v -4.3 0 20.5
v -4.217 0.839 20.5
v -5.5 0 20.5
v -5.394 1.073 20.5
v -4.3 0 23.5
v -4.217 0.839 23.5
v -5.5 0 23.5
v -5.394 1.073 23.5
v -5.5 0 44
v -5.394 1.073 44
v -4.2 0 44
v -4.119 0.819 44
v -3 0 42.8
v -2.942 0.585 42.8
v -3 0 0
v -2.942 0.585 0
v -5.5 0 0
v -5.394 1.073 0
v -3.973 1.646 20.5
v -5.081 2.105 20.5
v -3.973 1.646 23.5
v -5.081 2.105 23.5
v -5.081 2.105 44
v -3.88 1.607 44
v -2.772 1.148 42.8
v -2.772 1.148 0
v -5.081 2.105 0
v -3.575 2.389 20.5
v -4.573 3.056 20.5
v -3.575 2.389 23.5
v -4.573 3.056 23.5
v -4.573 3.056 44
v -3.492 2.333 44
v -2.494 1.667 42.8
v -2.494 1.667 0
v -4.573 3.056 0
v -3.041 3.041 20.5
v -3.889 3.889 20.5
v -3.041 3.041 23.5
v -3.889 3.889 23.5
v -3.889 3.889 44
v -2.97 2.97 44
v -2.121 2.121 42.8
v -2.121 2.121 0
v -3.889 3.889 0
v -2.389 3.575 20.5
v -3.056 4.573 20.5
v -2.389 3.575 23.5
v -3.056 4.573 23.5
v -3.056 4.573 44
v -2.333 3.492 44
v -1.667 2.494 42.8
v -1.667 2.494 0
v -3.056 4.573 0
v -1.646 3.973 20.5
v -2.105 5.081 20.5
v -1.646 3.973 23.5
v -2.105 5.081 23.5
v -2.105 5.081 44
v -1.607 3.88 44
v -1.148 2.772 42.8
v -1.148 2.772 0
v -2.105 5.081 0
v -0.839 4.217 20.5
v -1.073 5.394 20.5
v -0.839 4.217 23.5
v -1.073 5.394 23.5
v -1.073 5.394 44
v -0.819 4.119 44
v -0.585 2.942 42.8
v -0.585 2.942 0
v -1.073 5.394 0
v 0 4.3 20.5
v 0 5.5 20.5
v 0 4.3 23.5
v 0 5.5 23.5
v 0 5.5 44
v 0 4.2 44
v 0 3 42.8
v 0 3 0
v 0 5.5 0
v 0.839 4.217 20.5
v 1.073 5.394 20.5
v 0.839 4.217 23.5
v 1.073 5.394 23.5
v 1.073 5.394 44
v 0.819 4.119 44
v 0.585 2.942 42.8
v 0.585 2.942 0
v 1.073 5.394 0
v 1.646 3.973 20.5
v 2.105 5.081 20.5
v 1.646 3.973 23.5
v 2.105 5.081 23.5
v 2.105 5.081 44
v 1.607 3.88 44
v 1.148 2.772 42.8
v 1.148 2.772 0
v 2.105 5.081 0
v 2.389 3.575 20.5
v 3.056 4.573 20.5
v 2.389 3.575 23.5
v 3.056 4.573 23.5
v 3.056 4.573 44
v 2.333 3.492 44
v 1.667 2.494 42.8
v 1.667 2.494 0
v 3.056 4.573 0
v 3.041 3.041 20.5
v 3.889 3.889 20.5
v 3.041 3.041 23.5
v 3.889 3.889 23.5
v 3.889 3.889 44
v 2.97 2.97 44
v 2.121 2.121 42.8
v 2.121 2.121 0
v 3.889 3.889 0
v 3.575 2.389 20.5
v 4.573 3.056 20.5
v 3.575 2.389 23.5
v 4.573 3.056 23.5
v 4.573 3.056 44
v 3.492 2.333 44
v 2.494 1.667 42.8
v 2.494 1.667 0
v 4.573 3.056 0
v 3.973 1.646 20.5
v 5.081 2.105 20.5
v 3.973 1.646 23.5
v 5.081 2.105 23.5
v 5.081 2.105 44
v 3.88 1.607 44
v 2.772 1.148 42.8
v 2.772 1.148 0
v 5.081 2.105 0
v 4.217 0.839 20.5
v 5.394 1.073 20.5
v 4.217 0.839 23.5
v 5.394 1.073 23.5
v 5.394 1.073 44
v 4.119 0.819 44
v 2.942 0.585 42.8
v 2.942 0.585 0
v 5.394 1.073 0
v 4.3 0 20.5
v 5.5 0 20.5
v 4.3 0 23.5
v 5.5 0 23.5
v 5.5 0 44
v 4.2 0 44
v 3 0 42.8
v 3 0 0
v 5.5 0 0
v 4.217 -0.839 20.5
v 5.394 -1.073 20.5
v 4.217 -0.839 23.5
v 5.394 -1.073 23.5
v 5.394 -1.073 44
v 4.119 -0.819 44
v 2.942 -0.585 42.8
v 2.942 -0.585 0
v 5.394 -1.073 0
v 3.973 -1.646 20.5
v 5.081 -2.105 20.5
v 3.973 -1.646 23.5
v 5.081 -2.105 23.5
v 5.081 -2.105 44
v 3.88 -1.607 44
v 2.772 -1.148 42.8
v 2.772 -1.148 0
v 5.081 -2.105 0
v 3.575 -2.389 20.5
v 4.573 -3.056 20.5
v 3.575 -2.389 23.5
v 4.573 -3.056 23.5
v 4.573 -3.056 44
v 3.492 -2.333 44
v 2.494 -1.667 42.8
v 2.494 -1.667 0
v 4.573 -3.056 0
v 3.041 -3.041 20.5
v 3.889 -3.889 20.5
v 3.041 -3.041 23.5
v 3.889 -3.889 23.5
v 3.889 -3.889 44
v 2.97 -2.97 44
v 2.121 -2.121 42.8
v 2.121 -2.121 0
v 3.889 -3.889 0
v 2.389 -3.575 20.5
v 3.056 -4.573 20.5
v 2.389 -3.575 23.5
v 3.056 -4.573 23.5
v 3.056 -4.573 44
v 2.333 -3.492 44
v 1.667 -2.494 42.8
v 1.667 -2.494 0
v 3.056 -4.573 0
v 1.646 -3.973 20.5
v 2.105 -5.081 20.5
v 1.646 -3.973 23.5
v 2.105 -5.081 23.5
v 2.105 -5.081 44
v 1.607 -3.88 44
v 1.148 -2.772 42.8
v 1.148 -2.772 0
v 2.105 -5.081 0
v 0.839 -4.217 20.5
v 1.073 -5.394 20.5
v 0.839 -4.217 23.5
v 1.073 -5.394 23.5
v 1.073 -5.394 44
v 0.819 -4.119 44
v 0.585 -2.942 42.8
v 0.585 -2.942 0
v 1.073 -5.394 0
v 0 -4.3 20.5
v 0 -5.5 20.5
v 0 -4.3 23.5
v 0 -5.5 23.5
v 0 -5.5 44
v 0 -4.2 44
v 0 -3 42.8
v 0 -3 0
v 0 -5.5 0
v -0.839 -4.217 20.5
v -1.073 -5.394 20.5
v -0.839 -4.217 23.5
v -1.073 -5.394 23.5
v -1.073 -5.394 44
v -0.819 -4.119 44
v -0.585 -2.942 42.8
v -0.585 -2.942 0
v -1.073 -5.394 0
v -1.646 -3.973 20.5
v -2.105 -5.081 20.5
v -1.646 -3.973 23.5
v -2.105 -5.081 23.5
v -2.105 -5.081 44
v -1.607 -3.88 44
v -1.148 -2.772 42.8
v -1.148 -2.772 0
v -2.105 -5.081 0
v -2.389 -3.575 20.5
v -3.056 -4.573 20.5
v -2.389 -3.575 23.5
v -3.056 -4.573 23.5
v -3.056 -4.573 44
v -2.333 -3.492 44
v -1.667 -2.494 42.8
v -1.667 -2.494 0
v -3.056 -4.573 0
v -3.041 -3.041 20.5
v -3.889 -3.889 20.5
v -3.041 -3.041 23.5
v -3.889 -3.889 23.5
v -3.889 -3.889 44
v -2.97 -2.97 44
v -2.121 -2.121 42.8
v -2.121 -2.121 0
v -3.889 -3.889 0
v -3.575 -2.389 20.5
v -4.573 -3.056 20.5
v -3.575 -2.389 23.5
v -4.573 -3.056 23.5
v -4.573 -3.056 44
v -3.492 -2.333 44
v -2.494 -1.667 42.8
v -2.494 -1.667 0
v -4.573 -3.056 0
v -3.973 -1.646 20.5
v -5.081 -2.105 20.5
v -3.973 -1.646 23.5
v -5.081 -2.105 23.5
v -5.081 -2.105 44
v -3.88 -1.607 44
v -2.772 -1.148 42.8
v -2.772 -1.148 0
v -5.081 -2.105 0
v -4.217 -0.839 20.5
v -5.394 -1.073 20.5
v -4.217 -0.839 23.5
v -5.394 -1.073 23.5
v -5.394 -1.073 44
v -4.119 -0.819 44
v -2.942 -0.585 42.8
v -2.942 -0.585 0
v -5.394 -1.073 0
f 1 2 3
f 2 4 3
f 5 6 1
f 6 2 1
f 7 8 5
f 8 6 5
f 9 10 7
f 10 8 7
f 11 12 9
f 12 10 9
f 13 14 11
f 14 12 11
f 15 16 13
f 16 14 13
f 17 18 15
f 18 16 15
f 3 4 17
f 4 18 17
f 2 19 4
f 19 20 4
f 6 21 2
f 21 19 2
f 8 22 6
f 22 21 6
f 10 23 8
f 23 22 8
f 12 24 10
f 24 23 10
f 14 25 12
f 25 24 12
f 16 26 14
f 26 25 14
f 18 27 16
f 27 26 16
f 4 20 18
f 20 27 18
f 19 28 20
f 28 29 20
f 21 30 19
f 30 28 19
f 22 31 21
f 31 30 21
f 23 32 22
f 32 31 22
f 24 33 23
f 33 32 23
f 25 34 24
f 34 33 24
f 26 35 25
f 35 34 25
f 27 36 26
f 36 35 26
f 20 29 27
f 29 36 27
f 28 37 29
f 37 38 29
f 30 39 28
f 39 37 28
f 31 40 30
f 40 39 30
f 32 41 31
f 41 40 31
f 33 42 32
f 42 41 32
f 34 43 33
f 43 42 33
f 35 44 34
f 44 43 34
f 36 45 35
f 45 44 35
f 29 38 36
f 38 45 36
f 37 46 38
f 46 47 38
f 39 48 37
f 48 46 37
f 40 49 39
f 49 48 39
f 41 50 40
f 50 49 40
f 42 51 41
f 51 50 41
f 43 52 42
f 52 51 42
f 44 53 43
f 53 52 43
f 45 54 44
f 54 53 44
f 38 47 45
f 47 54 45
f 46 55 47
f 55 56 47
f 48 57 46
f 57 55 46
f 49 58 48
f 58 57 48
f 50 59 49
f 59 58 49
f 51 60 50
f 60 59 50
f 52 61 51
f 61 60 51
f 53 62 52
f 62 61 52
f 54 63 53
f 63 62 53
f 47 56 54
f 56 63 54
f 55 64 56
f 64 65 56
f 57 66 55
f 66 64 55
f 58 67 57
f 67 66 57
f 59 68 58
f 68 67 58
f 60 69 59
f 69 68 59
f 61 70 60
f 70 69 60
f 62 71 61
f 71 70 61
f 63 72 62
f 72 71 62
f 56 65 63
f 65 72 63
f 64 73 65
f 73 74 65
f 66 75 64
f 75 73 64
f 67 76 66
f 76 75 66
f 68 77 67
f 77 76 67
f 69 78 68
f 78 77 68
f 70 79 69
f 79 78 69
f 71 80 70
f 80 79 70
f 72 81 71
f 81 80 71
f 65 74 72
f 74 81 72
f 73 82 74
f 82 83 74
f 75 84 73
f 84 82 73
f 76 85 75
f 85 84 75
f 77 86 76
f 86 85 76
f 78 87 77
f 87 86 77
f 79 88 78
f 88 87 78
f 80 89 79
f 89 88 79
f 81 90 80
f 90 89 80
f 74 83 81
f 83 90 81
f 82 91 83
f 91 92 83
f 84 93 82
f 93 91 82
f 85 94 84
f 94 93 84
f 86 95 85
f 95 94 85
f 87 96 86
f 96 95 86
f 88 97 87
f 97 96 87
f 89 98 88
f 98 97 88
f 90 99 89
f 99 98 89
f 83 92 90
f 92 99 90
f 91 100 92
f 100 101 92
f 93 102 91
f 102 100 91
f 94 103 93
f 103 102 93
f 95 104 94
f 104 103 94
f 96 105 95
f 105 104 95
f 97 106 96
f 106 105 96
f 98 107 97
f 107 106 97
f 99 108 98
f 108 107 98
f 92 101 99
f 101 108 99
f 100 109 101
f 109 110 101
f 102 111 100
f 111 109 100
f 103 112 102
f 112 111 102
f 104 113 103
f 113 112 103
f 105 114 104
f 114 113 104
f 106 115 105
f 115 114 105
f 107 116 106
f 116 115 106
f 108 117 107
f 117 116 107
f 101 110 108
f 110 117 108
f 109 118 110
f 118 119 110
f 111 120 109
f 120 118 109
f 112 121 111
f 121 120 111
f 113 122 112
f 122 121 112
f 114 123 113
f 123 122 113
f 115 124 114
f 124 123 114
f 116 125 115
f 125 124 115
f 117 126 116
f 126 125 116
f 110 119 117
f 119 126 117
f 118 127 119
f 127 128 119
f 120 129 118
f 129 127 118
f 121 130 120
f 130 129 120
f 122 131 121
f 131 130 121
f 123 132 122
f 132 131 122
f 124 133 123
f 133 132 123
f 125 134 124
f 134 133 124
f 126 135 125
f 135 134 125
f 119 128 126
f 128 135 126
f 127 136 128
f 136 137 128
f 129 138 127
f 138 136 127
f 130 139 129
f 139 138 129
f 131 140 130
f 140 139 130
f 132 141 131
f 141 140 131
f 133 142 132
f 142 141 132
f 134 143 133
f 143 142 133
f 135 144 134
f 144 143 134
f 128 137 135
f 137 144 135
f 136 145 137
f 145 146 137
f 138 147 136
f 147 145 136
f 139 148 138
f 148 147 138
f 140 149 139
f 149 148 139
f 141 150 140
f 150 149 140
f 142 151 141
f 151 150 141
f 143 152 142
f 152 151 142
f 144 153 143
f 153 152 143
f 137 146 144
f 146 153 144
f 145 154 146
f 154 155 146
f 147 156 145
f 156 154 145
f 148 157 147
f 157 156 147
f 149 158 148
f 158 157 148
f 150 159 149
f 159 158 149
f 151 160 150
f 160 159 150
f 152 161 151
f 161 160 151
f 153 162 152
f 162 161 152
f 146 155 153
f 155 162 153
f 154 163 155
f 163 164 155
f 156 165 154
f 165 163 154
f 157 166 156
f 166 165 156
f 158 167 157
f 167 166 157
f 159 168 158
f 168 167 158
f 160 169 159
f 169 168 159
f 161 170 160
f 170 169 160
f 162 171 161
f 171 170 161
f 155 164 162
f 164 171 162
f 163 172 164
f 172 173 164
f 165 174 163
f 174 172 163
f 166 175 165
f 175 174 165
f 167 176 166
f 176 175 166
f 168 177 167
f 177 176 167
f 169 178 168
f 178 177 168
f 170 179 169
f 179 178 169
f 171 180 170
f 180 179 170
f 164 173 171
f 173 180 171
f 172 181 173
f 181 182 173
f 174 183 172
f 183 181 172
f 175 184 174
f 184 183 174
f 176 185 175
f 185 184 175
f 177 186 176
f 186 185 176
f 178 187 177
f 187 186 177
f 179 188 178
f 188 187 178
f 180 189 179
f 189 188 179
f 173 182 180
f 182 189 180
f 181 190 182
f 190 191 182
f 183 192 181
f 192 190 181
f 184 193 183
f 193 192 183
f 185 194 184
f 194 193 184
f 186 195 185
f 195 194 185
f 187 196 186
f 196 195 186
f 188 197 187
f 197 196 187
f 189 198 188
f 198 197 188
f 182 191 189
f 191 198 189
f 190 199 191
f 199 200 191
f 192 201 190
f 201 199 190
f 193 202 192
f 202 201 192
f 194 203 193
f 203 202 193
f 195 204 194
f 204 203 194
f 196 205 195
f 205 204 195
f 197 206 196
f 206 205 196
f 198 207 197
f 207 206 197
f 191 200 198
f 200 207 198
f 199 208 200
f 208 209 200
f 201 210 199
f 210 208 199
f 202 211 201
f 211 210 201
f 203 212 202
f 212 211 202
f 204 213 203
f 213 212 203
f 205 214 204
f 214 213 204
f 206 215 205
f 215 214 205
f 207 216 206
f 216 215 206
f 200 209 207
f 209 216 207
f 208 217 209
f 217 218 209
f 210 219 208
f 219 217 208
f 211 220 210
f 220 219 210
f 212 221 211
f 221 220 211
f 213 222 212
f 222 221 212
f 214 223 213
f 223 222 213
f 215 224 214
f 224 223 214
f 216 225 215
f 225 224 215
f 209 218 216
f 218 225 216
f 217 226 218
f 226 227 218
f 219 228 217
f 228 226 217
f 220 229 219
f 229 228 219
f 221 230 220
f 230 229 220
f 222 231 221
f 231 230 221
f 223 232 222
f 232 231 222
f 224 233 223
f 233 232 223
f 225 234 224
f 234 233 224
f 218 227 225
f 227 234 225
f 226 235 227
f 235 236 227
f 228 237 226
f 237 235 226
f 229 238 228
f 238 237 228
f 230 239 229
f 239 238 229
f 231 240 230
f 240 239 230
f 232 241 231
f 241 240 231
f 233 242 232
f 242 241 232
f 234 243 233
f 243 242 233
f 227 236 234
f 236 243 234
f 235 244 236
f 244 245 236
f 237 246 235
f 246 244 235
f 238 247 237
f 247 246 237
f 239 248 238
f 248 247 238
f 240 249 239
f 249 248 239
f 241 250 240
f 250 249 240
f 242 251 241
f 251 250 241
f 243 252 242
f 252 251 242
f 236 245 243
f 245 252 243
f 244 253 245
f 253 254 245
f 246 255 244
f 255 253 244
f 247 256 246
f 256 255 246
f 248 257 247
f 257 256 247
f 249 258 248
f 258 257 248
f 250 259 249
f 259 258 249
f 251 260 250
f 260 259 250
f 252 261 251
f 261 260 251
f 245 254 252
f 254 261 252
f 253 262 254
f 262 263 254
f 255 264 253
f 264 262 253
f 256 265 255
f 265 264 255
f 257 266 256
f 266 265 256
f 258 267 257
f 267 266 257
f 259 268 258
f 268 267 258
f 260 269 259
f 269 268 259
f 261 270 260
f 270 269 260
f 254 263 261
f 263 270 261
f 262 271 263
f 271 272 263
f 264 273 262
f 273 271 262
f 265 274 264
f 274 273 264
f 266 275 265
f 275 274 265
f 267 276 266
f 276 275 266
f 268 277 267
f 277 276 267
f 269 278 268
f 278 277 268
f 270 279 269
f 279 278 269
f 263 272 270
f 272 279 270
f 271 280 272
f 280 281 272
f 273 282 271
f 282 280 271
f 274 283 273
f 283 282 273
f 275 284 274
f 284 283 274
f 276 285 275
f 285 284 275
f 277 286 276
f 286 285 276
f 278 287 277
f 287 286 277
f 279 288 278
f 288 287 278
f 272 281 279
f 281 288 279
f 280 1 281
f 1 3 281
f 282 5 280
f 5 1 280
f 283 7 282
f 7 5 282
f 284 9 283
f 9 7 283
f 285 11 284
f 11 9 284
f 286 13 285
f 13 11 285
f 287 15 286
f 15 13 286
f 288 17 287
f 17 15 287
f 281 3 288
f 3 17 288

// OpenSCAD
$fn = 32;

// ----------------------------------------------------------------------
// Grooved revolve: thread_relief, bore R3
// ----------------------------------------------------------------------

// --- parameters (mm) ---
bore_r = 3;               // bore radius
outer_r = 5.5;            // outer radius of the body
total_h = 44;             // overall height, Z
wall = 2.5;               // radial wall thickness
groove_w = 3;             // groove width
groove_d = 1.2;           // groove depth
grooves = 1;              // number of outer grooves
relief = 1.2;             // thread relief leg at the bore mouth
relief_angle = 45;        // thread relief chamfer angle, degrees
fit_tol = 0.02;           // declared fit tolerance (prompt contract)
free_tol = 0.2;           // declared free tolerance (prompt contract)

bbox_x = 2 * outer_r;  // full diameter
bore_d = 2 * bore_r;  // bore diameter
body_d = 2 * outer_r;  // body diameter
revolve_angle = 360;  // full turn around the Z axis

profile = [[3, 0], [5.5, 0], [5.5, 20.5], [4.3, 20.5], [4.3, 23.5], [5.5, 23.5], [5.5, 44], [4.2, 44], [3, 42.8]];  // primary outline, 9 points, counter clockwise

// --- the one profile operation ---
rotate_extrude(angle = revolve_angle) polygon(points = profile);
